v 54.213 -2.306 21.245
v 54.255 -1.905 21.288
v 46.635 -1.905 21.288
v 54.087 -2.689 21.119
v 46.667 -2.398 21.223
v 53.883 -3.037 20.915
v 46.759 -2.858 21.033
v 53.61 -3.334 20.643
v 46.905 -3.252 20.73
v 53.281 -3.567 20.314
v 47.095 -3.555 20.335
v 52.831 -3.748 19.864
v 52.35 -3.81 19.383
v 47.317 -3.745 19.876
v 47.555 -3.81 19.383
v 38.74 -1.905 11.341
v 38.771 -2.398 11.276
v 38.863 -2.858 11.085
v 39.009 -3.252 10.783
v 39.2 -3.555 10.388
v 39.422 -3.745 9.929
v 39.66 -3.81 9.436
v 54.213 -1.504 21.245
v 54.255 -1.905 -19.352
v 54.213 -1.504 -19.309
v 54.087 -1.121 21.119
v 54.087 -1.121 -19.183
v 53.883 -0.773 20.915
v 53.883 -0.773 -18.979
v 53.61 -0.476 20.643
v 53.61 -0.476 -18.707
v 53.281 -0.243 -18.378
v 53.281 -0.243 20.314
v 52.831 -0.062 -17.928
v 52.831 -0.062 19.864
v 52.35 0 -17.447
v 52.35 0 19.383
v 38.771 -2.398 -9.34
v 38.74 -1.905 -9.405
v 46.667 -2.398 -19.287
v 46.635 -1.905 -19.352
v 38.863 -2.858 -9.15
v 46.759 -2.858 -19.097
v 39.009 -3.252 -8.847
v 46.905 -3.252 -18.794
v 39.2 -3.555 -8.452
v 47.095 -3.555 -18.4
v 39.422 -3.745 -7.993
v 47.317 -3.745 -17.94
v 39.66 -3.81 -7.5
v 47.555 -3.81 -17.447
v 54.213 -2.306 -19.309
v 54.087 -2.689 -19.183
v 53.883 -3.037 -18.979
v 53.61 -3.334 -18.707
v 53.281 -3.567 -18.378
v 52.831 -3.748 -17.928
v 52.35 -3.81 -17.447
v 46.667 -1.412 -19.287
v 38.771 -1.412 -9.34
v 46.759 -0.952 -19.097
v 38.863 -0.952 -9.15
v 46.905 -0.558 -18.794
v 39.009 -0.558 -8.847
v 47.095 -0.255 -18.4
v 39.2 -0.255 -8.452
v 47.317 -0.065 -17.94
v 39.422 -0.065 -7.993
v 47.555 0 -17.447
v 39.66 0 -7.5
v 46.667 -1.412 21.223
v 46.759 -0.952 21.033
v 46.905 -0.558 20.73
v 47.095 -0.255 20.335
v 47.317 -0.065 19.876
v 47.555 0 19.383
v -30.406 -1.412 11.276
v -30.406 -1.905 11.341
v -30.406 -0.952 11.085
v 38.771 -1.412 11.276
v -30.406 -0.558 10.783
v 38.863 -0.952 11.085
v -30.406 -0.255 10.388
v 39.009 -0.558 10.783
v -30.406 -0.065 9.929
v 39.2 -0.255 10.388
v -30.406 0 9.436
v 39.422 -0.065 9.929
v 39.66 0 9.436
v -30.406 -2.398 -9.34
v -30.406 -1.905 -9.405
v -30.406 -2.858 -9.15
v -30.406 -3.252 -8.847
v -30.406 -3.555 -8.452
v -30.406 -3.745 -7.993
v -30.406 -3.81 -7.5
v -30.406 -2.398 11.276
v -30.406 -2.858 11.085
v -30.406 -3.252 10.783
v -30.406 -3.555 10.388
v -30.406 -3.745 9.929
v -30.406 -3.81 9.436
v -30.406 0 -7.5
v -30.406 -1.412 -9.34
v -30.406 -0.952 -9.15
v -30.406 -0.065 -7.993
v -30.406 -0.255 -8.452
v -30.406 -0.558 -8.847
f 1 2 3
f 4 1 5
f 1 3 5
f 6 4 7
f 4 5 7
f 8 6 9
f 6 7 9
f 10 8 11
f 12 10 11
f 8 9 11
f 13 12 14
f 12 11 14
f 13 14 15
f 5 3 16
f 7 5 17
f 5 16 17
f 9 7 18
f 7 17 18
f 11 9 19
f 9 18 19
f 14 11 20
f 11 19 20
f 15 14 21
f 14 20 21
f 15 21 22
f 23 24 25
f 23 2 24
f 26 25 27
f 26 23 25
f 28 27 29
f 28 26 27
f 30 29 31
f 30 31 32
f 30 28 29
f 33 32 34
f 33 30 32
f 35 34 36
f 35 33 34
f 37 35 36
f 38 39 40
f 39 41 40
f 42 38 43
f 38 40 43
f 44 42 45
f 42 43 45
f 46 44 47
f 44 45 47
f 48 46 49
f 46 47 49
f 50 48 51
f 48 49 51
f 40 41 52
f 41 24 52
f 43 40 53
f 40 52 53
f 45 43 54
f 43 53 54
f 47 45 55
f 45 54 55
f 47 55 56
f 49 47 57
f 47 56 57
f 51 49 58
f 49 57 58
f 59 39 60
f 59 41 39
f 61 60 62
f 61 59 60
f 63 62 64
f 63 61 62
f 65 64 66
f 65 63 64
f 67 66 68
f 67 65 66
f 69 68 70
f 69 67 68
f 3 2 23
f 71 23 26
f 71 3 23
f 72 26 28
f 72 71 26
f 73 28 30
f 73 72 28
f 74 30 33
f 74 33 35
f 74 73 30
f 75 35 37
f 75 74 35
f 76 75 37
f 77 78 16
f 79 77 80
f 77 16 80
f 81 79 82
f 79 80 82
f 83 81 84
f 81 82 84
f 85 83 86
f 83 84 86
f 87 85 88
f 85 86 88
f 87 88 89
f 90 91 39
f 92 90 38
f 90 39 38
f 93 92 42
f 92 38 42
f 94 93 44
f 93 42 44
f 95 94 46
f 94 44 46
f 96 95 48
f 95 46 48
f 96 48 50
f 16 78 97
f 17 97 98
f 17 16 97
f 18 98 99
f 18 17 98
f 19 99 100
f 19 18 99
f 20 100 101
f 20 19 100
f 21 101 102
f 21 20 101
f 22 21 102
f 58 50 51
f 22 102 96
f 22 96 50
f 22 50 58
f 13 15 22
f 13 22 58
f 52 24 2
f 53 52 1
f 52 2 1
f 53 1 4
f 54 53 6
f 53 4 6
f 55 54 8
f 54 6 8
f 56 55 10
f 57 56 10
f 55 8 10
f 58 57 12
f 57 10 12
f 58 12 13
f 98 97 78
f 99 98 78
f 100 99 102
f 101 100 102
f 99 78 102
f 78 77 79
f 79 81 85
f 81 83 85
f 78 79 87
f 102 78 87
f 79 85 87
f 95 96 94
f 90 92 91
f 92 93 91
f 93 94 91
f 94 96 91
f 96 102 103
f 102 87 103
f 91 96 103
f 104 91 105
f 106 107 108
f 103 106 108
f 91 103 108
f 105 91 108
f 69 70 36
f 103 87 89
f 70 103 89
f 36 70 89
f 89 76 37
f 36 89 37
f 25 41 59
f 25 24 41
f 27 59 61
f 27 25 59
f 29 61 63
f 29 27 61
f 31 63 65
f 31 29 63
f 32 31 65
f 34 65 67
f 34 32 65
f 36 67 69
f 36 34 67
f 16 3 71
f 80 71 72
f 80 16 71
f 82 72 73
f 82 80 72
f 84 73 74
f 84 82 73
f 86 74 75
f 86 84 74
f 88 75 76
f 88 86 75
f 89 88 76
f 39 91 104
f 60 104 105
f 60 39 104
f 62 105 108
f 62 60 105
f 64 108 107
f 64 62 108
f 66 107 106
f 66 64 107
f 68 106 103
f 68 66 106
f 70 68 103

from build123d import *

# Parameters (mm, degrees)
F0_W     = 69.1453650223
F0_H     = 11.3406319083
F0_H_2   = 9.4049024593
F1_DEPTH = 3.81
F2_R     = 1.90499


# Not quite as in the source:
# - a fillet or chamfer is up to 0.001 mm smaller than in the source, because OpenCascade refuses the exact size


with BuildPart() as f1:
    # F0 (on Front) → F1 (new body)
    with BuildSketch(Plane.XZ):
        Polygon((46.6354282098, 21.2878647245), (38.7396977623, 11.3406319083), (38.7396977623, 0), (38.7396977623, -9.4049024593), (46.6354282098, -19.3521352755), (54.2554282098, -19.3521352755), (54.2554282098, 21.2878647245), align=None)
        with Locations((4.1670152511, 5.6703159541)):
            Rectangle(F0_W, F0_H)
        with Locations((4.1670152511, -4.7024512296)):
            Rectangle(F0_W, F0_H_2)
    extrude(amount=F1_DEPTH)

    # F2 (radius 1.905 in the source; OpenCascade refuses exactly that, so slightly less here)
    f2_edges = [f1.edges().sort_by_distance(p)[0] for p in [
        (4.167015, 0, -9.404902),
        (4.167015, 0, 11.340632),
        (4.167015, -3.81, -9.404902),
        (4.167015, -3.81, 11.340632),
        (50.445428, -3.81, -19.352135),
        (50.445428, 0, -19.352135),
        (50.445428, 0, 21.287865),
        (50.445428, -3.81, 21.287865),
        (54.255428, -3.81, 0.967865),
        (54.255428, 0, 0.967865),
        (42.687563, -3.81, 16.314248),
        (42.687563, -3.81, -14.378519),
        (42.687563, 0, -14.378519),
        (42.687563, 0, 16.314248),
    ]]
    fillet(f2_edges, radius=F2_R)


solid = f1.part
